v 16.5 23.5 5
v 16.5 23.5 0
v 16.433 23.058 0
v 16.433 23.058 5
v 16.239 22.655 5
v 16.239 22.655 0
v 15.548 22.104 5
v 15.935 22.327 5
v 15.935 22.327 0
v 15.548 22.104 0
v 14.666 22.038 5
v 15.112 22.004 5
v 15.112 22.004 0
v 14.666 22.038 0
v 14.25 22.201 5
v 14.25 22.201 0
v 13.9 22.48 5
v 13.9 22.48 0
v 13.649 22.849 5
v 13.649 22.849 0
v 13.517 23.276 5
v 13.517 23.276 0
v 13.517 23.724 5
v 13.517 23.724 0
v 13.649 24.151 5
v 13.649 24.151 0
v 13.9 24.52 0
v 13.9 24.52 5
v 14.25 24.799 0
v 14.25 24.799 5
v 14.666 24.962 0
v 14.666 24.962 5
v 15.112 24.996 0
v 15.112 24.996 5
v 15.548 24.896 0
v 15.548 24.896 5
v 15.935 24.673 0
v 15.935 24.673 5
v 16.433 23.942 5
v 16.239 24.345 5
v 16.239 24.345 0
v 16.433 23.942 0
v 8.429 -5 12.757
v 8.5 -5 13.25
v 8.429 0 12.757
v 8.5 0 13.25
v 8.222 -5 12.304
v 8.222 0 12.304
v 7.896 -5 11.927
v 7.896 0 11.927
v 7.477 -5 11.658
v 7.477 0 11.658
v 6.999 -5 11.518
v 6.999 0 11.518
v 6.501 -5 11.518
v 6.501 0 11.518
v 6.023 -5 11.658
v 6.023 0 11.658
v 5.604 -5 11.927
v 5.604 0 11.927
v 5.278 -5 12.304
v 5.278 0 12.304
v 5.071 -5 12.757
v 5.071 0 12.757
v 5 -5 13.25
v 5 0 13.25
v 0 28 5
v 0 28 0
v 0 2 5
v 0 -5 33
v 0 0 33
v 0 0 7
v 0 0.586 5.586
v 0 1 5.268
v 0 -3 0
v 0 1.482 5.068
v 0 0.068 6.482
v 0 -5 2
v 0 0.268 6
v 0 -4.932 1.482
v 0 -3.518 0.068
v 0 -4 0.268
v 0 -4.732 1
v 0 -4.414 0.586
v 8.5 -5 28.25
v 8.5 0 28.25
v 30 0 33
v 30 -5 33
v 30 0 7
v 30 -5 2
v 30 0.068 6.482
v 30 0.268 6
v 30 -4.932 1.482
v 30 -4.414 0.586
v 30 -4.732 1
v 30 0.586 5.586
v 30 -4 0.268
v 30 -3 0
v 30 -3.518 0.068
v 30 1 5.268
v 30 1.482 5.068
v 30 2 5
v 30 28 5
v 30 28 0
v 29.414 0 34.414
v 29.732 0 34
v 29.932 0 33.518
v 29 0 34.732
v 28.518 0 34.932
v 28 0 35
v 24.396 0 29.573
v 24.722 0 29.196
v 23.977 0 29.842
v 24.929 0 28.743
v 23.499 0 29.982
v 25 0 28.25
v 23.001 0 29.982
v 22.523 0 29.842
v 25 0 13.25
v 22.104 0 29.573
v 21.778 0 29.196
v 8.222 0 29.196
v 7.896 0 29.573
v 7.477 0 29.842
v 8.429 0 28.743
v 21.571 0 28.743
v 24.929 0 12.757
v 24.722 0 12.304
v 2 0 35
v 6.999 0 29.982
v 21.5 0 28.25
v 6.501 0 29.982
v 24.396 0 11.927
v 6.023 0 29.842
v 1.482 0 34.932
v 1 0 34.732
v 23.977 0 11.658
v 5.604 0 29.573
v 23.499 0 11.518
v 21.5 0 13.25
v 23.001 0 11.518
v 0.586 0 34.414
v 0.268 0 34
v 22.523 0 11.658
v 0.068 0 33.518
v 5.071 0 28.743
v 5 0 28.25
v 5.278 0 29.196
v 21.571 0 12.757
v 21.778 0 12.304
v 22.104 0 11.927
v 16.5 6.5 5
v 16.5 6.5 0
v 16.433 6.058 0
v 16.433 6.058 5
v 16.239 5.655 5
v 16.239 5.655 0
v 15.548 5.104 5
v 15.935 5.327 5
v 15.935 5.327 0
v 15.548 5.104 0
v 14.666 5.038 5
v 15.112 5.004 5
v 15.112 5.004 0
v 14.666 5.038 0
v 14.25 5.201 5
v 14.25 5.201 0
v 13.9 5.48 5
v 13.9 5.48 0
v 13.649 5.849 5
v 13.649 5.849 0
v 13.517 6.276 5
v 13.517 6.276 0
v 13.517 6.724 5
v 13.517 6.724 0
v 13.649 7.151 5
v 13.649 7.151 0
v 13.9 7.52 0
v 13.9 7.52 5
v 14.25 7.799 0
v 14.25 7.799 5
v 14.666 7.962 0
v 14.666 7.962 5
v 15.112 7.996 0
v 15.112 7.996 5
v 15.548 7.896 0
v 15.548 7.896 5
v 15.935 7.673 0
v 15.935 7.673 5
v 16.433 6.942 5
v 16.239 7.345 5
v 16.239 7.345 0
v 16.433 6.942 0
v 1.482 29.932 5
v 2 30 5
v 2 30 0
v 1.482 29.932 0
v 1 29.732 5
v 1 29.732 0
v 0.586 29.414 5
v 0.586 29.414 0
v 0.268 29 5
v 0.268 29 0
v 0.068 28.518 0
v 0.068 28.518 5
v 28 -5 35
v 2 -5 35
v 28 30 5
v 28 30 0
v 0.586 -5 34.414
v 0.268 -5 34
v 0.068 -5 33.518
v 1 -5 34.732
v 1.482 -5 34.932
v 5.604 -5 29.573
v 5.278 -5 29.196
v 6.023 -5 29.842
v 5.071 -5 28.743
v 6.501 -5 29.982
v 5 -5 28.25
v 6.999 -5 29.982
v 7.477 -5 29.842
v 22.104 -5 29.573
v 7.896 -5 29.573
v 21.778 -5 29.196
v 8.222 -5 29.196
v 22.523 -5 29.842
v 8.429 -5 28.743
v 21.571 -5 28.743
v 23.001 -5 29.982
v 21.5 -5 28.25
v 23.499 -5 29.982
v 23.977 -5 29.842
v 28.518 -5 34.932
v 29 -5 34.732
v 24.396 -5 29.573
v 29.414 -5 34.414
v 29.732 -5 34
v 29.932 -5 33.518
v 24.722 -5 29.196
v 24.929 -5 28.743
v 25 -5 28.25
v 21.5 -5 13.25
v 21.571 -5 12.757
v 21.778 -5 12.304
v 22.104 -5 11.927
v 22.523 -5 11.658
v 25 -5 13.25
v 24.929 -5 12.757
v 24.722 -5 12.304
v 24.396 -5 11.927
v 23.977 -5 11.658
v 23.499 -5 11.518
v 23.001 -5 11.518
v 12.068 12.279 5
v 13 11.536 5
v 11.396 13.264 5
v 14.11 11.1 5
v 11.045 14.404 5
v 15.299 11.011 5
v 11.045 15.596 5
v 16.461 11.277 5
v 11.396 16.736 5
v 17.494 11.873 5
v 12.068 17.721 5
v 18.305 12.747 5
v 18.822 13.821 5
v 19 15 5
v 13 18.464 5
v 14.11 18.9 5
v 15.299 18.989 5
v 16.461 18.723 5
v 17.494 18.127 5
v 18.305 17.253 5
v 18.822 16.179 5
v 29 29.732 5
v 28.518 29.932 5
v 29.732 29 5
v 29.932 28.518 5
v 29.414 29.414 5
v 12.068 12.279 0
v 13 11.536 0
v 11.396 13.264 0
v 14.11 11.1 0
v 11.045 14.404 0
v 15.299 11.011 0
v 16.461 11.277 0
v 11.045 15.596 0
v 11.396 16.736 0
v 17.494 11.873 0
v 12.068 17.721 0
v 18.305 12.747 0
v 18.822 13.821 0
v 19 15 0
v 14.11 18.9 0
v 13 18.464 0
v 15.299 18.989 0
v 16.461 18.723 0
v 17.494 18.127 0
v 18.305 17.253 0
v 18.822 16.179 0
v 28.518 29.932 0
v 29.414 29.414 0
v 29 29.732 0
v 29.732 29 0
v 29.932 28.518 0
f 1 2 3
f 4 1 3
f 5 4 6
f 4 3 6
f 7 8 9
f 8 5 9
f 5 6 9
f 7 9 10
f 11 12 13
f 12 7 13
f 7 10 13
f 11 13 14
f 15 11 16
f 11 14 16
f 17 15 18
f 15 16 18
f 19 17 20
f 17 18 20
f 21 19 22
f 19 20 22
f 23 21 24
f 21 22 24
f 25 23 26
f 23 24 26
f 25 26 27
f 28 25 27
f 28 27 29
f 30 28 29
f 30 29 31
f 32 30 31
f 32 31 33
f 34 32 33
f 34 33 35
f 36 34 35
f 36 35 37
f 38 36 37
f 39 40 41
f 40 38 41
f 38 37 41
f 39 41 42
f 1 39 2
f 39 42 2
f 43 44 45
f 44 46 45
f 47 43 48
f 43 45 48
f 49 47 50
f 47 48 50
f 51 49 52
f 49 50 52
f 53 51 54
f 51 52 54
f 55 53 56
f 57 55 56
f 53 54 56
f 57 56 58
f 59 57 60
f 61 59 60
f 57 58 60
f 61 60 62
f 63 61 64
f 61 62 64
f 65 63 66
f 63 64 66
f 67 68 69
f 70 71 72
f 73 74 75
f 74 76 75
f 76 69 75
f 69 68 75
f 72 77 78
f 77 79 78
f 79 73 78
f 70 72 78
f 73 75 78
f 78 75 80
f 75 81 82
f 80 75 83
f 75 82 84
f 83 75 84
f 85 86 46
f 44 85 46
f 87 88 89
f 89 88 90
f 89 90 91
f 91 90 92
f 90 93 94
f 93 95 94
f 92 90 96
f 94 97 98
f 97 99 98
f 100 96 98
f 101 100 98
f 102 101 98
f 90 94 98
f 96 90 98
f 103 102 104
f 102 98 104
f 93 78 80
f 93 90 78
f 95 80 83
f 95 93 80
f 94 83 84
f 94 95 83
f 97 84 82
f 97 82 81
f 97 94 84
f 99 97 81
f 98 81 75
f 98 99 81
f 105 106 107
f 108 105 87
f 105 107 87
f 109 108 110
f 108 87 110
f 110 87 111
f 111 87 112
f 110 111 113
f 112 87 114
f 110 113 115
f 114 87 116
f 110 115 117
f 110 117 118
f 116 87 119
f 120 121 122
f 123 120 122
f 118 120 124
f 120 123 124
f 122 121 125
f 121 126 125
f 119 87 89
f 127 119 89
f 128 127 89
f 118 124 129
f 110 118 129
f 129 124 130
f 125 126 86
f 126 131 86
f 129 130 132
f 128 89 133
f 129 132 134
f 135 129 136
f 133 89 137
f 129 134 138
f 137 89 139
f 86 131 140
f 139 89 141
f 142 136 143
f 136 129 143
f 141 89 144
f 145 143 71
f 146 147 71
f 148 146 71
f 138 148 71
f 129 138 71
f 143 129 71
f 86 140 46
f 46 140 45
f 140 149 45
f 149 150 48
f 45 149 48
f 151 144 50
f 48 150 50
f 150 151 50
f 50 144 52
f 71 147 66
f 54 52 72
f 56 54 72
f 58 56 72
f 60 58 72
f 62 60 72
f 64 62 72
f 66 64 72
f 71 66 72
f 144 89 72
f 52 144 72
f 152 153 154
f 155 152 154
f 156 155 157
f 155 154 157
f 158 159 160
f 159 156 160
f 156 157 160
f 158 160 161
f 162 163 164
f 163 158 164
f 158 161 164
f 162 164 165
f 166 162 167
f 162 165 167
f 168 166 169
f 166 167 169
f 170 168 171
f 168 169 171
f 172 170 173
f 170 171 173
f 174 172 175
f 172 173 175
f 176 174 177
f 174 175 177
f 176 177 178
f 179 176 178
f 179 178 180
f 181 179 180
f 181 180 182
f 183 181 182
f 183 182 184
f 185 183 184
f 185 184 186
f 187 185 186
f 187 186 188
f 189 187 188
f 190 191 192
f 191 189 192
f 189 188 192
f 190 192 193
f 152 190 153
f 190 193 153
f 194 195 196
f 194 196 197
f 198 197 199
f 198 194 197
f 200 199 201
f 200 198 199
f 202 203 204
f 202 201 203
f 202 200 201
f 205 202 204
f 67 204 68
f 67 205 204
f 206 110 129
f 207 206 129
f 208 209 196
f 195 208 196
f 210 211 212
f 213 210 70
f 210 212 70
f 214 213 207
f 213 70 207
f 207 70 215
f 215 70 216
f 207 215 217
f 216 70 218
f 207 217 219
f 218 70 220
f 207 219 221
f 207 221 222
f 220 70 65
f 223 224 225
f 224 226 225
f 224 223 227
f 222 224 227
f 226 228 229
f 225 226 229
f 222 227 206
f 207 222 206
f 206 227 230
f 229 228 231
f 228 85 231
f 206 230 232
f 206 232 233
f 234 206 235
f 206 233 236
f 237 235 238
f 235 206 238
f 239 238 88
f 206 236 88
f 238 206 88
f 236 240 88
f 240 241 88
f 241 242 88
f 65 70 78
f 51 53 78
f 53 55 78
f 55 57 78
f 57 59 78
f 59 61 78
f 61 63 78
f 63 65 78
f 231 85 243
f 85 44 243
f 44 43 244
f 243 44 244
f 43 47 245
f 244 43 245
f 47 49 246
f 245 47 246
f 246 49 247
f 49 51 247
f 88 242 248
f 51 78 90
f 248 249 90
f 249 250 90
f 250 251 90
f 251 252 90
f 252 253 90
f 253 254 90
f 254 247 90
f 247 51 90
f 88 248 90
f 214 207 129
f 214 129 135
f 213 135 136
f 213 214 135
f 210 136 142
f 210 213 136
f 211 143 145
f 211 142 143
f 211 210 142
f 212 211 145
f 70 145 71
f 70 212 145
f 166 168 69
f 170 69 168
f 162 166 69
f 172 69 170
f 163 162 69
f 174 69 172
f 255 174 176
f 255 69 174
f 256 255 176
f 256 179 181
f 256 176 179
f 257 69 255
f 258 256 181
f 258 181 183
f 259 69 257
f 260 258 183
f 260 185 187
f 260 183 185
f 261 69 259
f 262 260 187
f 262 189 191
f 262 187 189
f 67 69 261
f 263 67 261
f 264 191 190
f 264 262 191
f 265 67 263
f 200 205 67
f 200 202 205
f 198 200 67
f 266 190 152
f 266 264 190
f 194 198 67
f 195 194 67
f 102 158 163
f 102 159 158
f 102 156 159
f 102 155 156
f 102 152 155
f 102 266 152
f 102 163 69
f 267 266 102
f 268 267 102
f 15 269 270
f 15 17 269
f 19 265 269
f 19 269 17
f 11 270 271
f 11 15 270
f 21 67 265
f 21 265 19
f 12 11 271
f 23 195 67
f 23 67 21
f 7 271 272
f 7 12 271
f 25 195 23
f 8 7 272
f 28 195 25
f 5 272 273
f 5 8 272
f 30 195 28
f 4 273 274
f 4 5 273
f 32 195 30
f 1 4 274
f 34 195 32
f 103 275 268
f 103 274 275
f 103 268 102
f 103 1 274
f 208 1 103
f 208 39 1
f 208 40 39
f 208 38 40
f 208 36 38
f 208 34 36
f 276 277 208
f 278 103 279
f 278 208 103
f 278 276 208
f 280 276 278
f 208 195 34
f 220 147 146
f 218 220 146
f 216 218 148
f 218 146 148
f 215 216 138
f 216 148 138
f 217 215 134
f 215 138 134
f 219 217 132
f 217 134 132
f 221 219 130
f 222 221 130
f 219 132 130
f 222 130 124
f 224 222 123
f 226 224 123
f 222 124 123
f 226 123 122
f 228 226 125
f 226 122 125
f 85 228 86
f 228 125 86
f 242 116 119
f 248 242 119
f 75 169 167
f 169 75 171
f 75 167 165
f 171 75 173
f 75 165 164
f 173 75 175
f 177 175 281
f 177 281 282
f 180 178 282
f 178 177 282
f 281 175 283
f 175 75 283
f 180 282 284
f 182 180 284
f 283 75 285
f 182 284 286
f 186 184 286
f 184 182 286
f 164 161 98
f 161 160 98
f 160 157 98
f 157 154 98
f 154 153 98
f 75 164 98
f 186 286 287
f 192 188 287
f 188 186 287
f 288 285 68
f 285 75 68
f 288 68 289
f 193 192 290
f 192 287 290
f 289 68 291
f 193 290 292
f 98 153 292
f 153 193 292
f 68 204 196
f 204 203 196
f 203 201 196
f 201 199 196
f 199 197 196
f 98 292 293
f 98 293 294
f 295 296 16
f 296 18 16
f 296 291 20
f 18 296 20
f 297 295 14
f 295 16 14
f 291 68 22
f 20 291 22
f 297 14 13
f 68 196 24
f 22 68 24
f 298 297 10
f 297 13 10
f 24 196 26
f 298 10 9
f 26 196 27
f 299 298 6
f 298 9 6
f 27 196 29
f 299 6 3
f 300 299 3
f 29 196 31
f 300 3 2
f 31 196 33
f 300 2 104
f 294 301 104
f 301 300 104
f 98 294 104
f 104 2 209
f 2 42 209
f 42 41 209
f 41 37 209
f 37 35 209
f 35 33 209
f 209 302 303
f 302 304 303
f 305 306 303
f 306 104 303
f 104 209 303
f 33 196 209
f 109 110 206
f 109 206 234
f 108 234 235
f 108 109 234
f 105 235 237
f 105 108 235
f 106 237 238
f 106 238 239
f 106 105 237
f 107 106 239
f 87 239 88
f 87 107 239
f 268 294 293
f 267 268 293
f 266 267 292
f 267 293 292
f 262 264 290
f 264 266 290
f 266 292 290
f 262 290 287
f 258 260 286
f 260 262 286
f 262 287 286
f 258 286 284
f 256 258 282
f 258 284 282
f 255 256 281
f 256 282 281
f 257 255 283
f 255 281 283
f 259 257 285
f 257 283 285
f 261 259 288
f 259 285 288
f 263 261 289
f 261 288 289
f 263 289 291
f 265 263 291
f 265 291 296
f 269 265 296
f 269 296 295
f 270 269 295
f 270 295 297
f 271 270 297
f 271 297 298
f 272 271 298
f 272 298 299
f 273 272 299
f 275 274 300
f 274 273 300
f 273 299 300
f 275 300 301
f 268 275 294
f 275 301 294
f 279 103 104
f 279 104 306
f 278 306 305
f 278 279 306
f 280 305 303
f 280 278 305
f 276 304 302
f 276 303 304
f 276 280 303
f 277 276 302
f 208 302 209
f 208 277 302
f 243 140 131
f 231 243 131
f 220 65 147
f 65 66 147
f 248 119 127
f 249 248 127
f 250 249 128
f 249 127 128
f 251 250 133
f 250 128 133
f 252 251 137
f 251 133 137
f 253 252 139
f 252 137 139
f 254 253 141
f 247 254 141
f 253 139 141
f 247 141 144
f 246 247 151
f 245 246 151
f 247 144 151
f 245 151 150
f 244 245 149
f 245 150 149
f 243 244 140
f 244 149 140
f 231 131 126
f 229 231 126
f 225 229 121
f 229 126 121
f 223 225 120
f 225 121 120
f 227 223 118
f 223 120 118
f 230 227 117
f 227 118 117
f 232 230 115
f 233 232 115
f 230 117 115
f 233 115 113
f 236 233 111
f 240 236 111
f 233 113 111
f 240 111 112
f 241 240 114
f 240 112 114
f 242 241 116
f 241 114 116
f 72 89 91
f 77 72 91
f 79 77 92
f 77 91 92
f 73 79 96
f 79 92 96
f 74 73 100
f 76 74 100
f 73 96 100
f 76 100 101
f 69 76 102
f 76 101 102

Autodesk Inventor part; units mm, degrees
ref_plane "YZ Plane" through (0, 0, 0) normal (1, 0, 0) x (0, 1, 0)
ref_plane "XZ Plane" through (0, 0, 0) normal (0, 1, 0) x (-1, 0, 0)
ref_plane "XY Plane" through (0, 0, 0) normal (0, 0, 1) x (1, 0, 0)
sketch "Boceto1" plane through (0, 0, 0) normal (0, 0, 1) x (1, 0, 0)
  line L0 (0, 0) -> (30, 0)
  line L1 (30, 0) -> (30, 30)
  line L2 (30, 30) -> (0, 30)
  line L3 (0, 30) -> (0, 0)
  circle A0 centre (15, 15) radius 4
  circle A1 centre (15, 23.5) radius 1.5
  circle A2 centre (15, 6.5) radius 1.5
  dimension "d0" = 30
  dimension "d1" = 30
  dimension "d2" = 8
  dimension "d3" = 3
  dimension "d4" = 3
  dimension "d5" = 8.5
  dimension "d6" = 8.5
  dimension "d7" = 6.5
extrude "Extrusión1" add sketch "Boceto1" along normal blind 5
sketch "Boceto2" plane through (0, 0, 0) normal (0, 0, -1) x (-1, 0, 0)
  line L0 (-30, 0) -> (-30, 30) projected
  line L1 (-30, 0) -> (0, 0)
  line L2 (0, 0) -> (0, -5)
  line L3 (0, -5) -> (-30, -5)
  line L4 (-30, -5) -> (-30, 0)
  dimension "d10" = 5
extrude "Extrusión2" add sketch "Boceto2" against normal blind 35
sketch "Boceto3" plane through (0, 0, 5) normal (0, 1, 0) x (1, 0, 0)
  line L0 (6.75, -8.25) -> (6.75, -23.25) construction
  line L1 (5, -8.25) -> (5, -23.25)
  line L2 (8.5, -23.25) -> (8.5, -8.25)
  arc A0 (8.5, -8.25) -> (5, -8.25) centre (6.75, -8.25) ccw
  arc A1 (5, -23.25) -> (8.5, -23.25) centre (6.75, -23.25) ccw
  line L3 (23.25, -8.25) -> (23.25, -23.25) construction
  line L4 (21.5, -8.25) -> (21.5, -23.25)
  line L5 (25, -23.25) -> (25, -8.25)
  arc A2 (25, -8.25) -> (21.5, -8.25) centre (23.25, -8.25) ccw
  arc A3 (21.5, -23.25) -> (25, -23.25) centre (23.25, -23.25) ccw
  line L6 (0, 0) -> (0, -30) projected
  line L7 (30, 0) -> (30, -30) projected
  line L8 (30, -30) -> (0, -30) projected
  point P0 (0, 5)
  point P1 (6.75, -15.75)
  point P2 (23.25, -15.75)
  point P3 (6.75, -25)
  dimension "d13" = 3.5
  dimension "d14" = 3.5
  dimension "d15" = 15
  dimension "d16" = 15
  dimension "d17" = 5
  dimension "d18" = 5
  dimension "d19" = 0
  dimension "d20" = 5
extrude "Extrusión3" cut sketch "Boceto3" against normal blind 5
fillet "Empalme1" radius 2 1 edges at (15, -5, 0)
fillet "Empalme2" radius 2 5 edges at (0, -2.5, 35) (30, -2.5, 35) (30, 30, 2.5) (0, 30, 2.5) (15, 0, 5)
properties part number "soporte_motor"
